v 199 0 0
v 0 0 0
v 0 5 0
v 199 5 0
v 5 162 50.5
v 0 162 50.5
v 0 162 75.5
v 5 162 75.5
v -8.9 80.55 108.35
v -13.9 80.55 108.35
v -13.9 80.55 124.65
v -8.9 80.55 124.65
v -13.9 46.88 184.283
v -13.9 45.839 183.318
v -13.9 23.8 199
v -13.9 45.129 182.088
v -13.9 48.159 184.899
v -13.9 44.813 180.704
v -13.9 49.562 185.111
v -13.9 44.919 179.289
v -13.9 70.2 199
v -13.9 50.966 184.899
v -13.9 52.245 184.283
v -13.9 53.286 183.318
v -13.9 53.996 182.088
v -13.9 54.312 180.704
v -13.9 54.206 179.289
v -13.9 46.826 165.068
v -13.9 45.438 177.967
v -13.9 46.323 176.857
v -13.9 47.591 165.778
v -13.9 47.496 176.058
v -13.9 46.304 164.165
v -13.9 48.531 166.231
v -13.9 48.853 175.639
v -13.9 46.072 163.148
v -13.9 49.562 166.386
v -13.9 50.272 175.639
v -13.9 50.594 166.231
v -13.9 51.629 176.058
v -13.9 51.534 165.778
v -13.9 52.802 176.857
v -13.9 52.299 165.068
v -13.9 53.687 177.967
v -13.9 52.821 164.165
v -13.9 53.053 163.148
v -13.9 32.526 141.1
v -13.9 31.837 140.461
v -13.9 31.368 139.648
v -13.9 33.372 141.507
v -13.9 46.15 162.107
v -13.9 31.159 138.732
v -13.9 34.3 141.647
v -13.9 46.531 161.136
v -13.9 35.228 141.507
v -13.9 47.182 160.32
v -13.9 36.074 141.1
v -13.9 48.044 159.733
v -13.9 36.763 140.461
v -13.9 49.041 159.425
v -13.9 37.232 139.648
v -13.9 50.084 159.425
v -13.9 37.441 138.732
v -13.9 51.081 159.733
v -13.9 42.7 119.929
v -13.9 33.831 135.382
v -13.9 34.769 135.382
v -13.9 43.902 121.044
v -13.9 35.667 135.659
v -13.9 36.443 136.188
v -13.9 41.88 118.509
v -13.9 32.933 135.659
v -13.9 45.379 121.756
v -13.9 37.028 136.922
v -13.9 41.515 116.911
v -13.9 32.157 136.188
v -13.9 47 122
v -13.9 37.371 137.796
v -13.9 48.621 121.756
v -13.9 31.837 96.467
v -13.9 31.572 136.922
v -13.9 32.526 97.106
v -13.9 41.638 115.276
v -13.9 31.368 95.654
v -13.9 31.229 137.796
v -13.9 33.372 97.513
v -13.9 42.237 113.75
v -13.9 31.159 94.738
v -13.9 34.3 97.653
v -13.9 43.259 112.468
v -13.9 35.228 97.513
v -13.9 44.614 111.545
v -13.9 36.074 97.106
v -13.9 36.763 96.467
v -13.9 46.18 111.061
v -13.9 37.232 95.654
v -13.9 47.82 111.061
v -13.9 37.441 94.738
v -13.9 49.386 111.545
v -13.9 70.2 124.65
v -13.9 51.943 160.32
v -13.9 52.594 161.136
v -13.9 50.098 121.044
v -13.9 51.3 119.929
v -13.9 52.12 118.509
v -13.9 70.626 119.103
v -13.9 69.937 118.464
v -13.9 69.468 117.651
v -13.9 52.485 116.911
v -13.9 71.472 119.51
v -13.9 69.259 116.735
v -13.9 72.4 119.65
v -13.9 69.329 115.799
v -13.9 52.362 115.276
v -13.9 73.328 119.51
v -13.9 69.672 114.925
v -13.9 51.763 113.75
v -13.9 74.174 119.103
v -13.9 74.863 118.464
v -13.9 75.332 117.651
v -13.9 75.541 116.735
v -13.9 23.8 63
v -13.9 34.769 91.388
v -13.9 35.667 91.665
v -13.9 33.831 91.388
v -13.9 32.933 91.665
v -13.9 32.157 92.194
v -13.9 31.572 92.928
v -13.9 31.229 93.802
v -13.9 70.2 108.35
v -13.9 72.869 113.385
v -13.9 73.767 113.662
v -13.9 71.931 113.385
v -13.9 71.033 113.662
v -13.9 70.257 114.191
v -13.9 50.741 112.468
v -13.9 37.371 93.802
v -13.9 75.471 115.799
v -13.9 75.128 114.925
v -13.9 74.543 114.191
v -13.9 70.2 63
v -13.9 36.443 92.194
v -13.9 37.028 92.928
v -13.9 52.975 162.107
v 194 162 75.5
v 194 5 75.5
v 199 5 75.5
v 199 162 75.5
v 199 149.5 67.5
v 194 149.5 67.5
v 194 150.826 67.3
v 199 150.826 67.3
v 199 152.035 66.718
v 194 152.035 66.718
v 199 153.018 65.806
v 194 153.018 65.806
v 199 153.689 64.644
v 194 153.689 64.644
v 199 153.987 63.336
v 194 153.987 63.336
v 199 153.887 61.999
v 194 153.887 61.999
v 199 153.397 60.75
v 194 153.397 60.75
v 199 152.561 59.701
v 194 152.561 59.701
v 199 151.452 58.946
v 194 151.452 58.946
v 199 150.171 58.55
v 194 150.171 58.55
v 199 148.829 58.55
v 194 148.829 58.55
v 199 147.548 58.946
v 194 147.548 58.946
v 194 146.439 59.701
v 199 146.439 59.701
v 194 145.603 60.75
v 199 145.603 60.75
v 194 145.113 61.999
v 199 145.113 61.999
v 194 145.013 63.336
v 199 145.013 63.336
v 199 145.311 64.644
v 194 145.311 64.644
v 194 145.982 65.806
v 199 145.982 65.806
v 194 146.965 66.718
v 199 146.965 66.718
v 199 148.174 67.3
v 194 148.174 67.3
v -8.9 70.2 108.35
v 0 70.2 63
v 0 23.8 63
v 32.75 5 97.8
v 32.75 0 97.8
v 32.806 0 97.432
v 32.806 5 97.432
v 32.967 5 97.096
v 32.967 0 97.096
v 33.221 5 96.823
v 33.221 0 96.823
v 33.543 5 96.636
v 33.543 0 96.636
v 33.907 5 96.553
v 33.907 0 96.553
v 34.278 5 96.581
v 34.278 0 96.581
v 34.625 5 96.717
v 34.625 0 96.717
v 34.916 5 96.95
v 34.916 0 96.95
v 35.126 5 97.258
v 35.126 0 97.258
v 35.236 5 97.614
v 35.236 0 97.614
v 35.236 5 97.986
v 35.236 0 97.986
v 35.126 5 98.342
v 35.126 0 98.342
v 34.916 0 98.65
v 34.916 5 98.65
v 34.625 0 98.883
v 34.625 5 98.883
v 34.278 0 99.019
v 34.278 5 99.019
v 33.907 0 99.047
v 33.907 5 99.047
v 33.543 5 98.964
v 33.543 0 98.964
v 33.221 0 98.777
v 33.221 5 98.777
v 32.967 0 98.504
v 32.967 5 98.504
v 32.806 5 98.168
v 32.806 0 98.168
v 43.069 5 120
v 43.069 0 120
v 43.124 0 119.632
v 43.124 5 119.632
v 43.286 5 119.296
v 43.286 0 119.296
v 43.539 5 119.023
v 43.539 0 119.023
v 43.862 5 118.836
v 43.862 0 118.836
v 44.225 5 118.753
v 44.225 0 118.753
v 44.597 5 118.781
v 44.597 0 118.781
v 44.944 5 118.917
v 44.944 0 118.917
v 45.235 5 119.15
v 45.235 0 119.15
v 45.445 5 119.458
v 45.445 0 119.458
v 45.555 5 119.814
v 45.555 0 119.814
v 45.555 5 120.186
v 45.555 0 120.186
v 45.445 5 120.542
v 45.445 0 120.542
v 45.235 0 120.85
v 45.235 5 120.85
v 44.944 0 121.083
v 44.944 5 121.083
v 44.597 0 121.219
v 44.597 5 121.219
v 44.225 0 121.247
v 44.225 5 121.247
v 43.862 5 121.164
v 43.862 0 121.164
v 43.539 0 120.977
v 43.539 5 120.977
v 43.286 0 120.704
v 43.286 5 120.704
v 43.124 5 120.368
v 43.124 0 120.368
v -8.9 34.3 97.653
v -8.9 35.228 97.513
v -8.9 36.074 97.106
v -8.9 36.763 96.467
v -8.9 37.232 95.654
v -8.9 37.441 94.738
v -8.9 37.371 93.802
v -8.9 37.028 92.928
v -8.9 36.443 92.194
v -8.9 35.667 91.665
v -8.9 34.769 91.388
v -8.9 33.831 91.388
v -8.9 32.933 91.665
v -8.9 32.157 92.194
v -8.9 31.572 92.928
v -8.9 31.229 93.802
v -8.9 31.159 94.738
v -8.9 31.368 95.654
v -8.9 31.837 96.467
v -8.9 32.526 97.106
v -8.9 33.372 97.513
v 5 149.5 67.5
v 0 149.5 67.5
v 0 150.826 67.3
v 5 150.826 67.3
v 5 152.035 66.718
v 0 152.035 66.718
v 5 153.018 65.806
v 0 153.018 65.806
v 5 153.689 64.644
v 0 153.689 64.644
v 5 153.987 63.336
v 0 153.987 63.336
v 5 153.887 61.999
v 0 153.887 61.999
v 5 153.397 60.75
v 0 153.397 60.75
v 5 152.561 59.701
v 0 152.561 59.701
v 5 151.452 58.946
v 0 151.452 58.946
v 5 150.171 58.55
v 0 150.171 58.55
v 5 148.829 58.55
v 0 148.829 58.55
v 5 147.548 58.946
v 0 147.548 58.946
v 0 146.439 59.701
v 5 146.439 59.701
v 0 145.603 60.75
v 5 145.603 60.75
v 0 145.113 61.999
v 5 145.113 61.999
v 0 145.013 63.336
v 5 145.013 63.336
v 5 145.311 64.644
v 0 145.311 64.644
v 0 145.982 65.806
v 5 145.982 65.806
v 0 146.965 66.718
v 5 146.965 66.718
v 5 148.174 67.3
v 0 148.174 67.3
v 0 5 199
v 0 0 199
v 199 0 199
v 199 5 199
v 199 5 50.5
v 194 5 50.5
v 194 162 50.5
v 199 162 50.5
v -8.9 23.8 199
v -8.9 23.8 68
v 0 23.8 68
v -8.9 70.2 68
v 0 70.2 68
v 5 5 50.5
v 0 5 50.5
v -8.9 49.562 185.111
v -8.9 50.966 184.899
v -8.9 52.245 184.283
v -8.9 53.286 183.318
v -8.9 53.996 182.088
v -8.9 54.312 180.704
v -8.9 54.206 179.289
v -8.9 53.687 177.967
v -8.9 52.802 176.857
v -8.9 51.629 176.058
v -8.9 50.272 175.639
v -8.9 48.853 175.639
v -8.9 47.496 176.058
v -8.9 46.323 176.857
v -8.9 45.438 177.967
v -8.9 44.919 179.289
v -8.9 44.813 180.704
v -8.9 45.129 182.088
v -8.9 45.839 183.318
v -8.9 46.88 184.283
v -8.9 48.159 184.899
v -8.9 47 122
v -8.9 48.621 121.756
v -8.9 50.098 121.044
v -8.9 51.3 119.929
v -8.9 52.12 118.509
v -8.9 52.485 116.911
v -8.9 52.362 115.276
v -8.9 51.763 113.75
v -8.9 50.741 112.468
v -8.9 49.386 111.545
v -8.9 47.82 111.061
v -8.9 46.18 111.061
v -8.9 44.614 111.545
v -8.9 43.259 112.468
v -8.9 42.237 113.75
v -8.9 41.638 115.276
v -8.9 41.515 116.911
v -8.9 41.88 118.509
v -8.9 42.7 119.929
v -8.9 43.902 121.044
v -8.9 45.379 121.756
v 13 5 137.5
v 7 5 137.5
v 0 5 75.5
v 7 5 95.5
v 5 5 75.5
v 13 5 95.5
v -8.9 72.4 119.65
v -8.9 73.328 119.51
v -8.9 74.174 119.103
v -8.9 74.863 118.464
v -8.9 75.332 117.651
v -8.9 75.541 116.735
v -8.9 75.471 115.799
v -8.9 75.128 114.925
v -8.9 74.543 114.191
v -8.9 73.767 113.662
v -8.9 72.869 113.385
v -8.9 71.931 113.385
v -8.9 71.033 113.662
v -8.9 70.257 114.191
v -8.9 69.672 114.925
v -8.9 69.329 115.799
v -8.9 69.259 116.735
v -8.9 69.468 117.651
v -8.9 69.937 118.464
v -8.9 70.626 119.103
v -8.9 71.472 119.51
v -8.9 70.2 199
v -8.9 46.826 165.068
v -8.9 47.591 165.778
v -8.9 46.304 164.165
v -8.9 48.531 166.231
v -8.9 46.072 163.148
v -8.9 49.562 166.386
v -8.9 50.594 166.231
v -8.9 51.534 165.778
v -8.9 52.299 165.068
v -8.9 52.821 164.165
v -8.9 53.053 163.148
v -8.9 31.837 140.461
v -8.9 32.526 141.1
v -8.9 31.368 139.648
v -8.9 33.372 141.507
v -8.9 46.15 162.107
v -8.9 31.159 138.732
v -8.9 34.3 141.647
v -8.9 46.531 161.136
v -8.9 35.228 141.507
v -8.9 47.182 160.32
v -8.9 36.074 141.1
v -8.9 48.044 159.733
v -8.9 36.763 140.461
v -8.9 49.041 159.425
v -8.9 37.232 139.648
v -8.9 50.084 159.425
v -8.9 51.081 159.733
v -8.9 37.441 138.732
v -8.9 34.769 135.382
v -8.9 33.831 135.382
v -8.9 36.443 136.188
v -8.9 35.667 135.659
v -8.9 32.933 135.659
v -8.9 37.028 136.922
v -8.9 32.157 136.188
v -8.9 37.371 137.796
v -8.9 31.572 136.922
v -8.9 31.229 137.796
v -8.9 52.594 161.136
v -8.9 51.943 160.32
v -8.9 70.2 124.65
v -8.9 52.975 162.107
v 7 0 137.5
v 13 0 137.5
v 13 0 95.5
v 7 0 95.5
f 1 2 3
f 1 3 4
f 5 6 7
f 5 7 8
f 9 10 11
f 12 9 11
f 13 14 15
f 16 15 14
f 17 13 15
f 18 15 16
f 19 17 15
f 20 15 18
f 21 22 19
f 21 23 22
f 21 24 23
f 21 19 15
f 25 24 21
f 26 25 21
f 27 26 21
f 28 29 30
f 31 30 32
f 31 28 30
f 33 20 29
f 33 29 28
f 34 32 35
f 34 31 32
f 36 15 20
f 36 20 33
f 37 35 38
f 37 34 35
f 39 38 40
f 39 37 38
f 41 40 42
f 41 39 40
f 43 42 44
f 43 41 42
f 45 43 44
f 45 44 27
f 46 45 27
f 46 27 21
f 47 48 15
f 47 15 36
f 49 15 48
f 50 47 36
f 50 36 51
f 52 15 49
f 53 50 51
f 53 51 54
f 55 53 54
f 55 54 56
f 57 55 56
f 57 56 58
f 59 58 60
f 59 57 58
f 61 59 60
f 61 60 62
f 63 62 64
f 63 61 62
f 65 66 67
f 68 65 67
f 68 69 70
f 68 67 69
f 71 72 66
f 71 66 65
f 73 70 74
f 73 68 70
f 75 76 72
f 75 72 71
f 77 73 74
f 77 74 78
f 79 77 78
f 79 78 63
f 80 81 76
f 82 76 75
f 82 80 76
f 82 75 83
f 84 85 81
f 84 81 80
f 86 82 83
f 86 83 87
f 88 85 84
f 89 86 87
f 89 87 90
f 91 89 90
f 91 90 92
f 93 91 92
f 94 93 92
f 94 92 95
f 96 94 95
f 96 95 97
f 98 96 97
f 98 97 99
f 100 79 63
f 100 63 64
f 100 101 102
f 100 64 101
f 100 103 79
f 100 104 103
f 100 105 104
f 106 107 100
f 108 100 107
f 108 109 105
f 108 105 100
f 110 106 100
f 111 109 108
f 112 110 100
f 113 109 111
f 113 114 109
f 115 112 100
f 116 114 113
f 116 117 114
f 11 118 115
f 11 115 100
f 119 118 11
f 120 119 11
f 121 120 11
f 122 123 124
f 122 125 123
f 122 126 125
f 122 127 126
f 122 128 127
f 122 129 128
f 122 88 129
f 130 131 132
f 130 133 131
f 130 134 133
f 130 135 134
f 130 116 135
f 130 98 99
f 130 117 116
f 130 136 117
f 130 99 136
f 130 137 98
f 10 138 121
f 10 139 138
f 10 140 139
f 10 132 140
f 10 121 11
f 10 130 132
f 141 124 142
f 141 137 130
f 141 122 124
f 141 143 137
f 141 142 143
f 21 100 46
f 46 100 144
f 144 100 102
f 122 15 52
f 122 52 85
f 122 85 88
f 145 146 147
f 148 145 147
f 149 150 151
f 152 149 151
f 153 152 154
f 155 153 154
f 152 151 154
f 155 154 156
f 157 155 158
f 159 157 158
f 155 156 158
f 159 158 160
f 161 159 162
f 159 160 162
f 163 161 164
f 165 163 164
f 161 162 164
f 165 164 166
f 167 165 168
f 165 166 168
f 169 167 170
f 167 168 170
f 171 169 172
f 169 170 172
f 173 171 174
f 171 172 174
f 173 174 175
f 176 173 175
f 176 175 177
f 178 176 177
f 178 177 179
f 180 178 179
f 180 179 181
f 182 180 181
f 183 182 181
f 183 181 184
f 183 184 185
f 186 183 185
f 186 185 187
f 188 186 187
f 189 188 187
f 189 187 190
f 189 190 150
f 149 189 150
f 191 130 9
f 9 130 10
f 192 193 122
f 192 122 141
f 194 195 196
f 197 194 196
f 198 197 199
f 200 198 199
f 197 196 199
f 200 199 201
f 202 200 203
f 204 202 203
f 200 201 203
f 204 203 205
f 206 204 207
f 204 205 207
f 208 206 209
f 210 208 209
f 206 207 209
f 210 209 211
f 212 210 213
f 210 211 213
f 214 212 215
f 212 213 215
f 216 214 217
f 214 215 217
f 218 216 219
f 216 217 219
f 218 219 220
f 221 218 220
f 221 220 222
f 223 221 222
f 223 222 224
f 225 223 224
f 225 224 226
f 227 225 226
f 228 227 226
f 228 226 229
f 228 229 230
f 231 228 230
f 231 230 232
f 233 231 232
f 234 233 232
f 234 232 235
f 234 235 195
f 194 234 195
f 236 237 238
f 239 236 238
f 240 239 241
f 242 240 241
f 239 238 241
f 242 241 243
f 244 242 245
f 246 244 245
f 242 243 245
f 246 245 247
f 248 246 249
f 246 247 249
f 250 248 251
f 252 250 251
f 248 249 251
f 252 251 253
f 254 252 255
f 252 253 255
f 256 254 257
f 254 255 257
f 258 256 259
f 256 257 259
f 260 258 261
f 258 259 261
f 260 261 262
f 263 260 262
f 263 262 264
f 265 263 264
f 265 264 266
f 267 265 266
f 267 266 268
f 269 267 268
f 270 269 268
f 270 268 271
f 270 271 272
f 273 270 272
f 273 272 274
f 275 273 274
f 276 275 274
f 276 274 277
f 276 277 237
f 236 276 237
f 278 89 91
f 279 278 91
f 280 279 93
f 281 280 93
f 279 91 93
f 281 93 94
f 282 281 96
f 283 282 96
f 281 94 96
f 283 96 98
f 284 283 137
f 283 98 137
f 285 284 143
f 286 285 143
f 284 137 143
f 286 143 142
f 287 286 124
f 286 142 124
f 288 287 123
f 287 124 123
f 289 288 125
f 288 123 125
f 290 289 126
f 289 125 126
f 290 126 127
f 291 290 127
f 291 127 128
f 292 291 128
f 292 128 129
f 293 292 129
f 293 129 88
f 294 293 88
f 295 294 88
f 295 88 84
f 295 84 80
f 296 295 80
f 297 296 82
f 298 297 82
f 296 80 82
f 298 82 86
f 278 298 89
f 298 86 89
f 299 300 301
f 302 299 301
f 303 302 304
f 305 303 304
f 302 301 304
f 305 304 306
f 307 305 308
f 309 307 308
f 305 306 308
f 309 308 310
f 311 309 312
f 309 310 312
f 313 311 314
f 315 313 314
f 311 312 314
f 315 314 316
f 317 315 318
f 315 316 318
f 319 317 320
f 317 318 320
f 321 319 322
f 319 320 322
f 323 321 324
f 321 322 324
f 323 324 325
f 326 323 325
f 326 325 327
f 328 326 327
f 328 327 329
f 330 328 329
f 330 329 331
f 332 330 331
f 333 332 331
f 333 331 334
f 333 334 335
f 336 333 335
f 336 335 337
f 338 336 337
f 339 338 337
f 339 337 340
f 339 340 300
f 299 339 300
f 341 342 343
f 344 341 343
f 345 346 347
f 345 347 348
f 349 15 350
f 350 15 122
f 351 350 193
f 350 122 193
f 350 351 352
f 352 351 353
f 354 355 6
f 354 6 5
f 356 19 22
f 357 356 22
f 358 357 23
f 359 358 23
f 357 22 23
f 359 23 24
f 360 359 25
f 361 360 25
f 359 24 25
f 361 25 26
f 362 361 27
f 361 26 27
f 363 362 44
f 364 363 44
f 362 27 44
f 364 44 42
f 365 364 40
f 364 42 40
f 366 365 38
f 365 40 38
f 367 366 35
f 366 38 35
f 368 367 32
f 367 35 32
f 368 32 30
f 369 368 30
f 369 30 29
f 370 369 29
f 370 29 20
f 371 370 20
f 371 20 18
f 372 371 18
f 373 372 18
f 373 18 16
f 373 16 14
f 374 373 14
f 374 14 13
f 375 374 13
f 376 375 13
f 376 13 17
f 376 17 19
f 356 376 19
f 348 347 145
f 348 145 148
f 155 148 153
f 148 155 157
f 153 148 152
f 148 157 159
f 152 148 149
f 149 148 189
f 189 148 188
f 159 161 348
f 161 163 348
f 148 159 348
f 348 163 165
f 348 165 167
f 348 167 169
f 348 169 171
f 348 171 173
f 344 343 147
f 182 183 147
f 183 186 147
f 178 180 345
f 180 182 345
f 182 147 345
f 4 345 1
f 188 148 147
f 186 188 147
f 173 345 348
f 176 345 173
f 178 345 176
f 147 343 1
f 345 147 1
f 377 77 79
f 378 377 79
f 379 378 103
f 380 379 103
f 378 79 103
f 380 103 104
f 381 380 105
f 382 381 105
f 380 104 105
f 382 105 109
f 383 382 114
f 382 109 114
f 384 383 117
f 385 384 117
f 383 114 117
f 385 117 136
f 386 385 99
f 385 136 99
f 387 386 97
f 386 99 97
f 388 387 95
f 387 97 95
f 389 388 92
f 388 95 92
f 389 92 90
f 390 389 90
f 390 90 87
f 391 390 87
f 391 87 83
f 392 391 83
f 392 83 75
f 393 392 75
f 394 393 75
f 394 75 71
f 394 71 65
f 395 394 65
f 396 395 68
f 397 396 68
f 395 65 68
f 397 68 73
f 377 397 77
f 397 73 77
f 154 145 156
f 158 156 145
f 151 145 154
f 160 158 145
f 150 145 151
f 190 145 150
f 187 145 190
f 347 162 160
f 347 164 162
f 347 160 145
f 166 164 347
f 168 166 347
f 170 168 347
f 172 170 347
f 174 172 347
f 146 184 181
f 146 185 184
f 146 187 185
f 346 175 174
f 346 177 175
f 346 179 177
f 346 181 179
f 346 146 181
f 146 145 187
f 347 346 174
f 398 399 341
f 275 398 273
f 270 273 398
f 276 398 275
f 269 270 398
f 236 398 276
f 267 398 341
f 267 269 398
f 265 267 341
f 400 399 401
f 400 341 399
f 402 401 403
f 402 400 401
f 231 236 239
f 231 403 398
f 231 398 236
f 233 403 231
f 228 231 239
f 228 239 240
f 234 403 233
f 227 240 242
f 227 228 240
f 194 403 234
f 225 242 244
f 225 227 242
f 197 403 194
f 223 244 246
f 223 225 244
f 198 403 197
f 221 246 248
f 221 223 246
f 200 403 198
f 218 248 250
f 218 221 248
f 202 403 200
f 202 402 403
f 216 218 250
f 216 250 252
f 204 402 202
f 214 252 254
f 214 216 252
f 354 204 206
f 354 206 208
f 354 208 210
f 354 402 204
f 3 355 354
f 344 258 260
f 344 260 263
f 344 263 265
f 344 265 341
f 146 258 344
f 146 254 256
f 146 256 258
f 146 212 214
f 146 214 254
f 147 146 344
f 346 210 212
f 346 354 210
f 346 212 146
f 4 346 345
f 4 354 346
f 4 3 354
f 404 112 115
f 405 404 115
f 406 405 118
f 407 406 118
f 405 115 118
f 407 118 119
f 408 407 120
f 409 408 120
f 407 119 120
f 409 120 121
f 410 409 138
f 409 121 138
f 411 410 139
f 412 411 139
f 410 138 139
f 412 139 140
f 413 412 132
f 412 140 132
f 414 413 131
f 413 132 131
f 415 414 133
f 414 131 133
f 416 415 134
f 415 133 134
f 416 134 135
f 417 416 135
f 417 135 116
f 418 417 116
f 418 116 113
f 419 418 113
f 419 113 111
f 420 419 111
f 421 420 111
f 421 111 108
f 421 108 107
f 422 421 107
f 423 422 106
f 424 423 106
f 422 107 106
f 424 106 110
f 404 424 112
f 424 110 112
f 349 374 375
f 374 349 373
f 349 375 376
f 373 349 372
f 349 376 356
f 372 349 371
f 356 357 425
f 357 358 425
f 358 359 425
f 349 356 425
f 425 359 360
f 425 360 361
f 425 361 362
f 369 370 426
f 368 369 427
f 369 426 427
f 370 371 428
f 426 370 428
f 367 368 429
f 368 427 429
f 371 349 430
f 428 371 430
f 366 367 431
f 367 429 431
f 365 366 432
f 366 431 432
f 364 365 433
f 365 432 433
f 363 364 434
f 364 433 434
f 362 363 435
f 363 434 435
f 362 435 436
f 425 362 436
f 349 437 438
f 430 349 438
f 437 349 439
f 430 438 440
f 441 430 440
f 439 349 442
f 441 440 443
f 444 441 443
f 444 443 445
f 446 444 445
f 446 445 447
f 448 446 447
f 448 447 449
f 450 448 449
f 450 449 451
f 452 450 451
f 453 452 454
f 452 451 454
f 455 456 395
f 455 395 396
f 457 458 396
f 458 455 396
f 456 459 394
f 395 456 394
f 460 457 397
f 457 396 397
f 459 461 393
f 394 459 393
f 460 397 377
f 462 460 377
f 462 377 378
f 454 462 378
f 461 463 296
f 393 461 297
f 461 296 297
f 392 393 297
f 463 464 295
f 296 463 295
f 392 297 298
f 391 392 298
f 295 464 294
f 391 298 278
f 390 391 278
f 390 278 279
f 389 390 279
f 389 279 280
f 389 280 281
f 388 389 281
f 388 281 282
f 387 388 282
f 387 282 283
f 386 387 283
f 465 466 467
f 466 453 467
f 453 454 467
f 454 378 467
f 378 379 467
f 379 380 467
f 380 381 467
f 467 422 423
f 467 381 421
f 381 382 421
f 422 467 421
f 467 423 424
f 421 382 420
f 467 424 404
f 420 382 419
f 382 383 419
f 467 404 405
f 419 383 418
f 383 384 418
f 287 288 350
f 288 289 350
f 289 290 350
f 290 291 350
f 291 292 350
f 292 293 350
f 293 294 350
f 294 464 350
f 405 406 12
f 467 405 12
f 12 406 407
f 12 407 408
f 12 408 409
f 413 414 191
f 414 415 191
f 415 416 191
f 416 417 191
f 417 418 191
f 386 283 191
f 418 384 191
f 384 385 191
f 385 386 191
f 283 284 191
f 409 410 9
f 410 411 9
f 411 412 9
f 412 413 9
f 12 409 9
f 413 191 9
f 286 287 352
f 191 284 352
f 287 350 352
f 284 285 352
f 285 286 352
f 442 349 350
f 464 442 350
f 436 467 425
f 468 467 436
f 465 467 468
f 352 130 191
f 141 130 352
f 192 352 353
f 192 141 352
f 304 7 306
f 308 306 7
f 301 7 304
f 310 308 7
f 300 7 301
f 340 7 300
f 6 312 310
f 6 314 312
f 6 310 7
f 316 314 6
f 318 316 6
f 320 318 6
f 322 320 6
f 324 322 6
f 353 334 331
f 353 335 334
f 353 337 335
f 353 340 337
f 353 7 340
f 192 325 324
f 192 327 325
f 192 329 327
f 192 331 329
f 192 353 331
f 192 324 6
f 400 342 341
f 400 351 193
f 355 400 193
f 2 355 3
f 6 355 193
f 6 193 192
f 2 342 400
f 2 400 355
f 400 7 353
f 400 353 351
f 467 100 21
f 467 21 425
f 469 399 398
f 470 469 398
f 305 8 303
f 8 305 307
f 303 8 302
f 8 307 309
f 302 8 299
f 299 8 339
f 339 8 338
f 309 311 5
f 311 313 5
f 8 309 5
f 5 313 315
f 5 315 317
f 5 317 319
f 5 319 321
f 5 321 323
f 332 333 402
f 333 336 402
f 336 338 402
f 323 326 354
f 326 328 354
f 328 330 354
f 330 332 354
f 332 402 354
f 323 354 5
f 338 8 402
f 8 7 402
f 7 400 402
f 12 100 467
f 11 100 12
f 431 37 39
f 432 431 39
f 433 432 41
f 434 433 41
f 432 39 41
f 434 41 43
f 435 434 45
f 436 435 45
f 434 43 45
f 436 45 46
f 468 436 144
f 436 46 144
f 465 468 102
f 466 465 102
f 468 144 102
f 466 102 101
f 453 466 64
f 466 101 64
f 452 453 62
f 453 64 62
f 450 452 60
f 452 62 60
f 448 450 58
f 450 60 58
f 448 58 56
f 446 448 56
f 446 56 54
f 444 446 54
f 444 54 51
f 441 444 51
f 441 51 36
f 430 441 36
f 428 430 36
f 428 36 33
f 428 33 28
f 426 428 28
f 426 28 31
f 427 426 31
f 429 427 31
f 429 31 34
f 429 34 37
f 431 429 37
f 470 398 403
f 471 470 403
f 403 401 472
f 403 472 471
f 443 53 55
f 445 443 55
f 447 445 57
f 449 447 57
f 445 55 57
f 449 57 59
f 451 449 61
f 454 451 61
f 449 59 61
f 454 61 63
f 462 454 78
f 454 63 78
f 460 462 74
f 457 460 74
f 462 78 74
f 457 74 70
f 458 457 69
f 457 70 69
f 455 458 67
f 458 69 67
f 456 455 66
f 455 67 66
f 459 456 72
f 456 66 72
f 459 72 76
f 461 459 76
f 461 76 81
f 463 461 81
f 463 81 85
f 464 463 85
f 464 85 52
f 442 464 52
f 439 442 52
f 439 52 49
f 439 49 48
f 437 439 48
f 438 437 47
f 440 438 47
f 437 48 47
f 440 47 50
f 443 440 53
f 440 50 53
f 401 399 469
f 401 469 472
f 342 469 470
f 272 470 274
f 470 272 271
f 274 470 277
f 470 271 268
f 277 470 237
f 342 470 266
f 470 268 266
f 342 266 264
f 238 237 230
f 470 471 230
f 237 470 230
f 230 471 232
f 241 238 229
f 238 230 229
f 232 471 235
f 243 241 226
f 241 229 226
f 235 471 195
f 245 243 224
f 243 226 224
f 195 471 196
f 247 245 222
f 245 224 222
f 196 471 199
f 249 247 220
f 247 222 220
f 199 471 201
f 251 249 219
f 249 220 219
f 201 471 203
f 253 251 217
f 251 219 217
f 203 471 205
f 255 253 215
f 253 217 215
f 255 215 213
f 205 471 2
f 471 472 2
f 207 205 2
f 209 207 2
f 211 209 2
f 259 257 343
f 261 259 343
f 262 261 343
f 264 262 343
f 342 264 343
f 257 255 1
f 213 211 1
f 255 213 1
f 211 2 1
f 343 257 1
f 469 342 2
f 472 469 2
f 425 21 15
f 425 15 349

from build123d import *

# Parameters (mm, degrees)
SKETCH1_W                 = 199
SKETCH1_H                 = 199
BOSS_EXTRUDE1_DEPTH       = 5
SKETCH2_W                 = 5
SKETCH2_H                 = 25
BOSS_EXTRUDE2_DEPTH       = 18.8
SKETCH3_W                 = 5
SKETCH3_H                 = 25
BOSS_EXTRUDE3_DEPTH       = 46.4
SKETCH4_W                 = 5
SKETCH4_H                 = 25
BOSS_EXTRUDE4_DEPTH       = 91.8
SKETCH5_W                 = 5
SKETCH5_H                 = 25
BOSS_EXTRUDE5_DEPTH       = 157
SKETCH6_R                 = 4.5
CUT_EXTRUDE1_DEPTH        = 325.724498614
SKETCH8_W                 = 5
SKETCH8_H                 = 46.4
BOSS_EXTRUDE6_DEPTH       = 13.9
SKETCH9_W                 = 5
SKETCH9_H                 = 46.4
BOSS_EXTRUDE7_DEPTH       = 131
SKETCH11_W                = 16.3
SKETCH11_H                = 10.35
BOSS_EXTRUDE8_DEPTH       = 5
SKETCH10_R                = 5.5
SKETCH10_R_2              = 3.15
CUT_EXTRUDE2_DEPTH        = 5
SKETCH12_W                = 6
SKETCH12_H                = 42
CUT_EXTRUDE3_DEPTH        = 5
SKETCH17_R                = 3.5
CUT_EXTRUDE7_DEPTH        = 9
M3X0_5_TAPPED_HOLE1_D     = 2.5
M3X0_5_TAPPED_HOLE1_DEPTH = 7.5
M3X0_5_TAPPED_HOLE1_TIP   = 0.751075774
SKETCH20_R                = 4.7625
CUT_EXTRUDE8_DEPTH        = 10


with BuildPart() as part:
    # Sketch1 → Boss-Extrude1 (new body)
    with BuildSketch(Plane(origin=(0, 0, 0), x_dir=(1, 0, 0), z_dir=(0, 1, 0))):
        with Locations((99.5, -99.5)):
            Rectangle(SKETCH1_W, SKETCH1_H)
    extrude(amount=BOSS_EXTRUDE1_DEPTH)

    # Sketch2 → Boss-Extrude2 (add)
    with BuildSketch(Plane(origin=(0, 5, 0), x_dir=(1, 0, 0), z_dir=(0, 1, 0))):
        with Locations((2.5, -63)):
            Rectangle(SKETCH2_W, SKETCH2_H)
    extrude(amount=BOSS_EXTRUDE2_DEPTH)

    # Sketch3 → Boss-Extrude3 (add)
    with BuildSketch(Plane(origin=(0, 23.8, 0), x_dir=(1, 0, 0), z_dir=(0, 1, 0))):
        with Locations((2.5, -63)):
            Rectangle(SKETCH3_W, SKETCH3_H)
    extrude(amount=BOSS_EXTRUDE3_DEPTH)

    # Sketch4 → Boss-Extrude4 (add)
    with BuildSketch(Plane(origin=(0, 70.2, 0), x_dir=(1, 0, 0), z_dir=(0, 1, 0))):
        with Locations((2.5, -63)):
            Rectangle(SKETCH4_W, SKETCH4_H)
    extrude(amount=BOSS_EXTRUDE4_DEPTH)

    # Sketch5 → Boss-Extrude5 (add)
    with BuildSketch(Plane(origin=(0, 5, 0), x_dir=(1, 0, 0), z_dir=(0, 1, 0))):
        with Locations((196.5, -63)):
            Rectangle(SKETCH5_W, SKETCH5_H)
    extrude(amount=BOSS_EXTRUDE5_DEPTH)

    # Sketch6 → Cut-Extrude1 (cut, through all)
    with BuildSketch(Plane.ZY):
        with Locations((63, 149.5)):
            Circle(SKETCH6_R)
    extrude(amount=-CUT_EXTRUDE1_DEPTH, mode=Mode.SUBTRACT)

    # Sketch8 → Boss-Extrude6 (add)
    with BuildSketch(Plane.ZY):
        with Locations((65.5, 47)):
            Rectangle(SKETCH8_W, SKETCH8_H)
    extrude(amount=BOSS_EXTRUDE6_DEPTH)

    # Sketch9 → Boss-Extrude7 (add)
    with BuildSketch(Plane.XY.offset(68)):
        with Locations((-11.4, 47)):
            Rectangle(SKETCH9_W, SKETCH9_H)
    extrude(amount=BOSS_EXTRUDE7_DEPTH)

    # Sketch11 → Boss-Extrude8 (add)
    with BuildSketch(Plane.ZY.offset(13.9)):
        with Locations((116.5, 75.375)):
            Rectangle(SKETCH11_W, SKETCH11_H)
    extrude(amount=-BOSS_EXTRUDE8_DEPTH)

    # Sketch10 → Cut-Extrude2 (cut)
    with BuildSketch(Plane.ZY.offset(13.9)):
        with Locations((116.5, 47)):
            Circle(SKETCH10_R)
        with Locations((116.5, 72.4)):
            Circle(SKETCH10_R_2)
        with Locations((138.497045256, 34.3)):
            Circle(SKETCH10_R_2)
        with Locations((94.502954744, 34.3)):
            Circle(SKETCH10_R_2)
    extrude(amount=-CUT_EXTRUDE2_DEPTH, mode=Mode.SUBTRACT)

    # Sketch12 → Cut-Extrude3 (cut)
    with BuildSketch(Plane(origin=(0, 5, 0), x_dir=(1, 0, 0), z_dir=(0, 1, 0))):
        with Locations((10, -116.5)):
            Rectangle(SKETCH12_W, SKETCH12_H)
    extrude(amount=-CUT_EXTRUDE3_DEPTH, mode=Mode.SUBTRACT)

    # Sketch17 → Cut-Extrude7 (cut)
    with BuildSketch(Plane.ZY.offset(13.9)):
        with Locations((162.886026442, 49.5625)):
            Circle(SKETCH17_R)
    extrude(amount=-CUT_EXTRUDE7_DEPTH, mode=Mode.SUBTRACT)

    # M3x0.5 Tapped Hole1
    with Locations(Plane(origin=(0, 5, 0), x_dir=(1, 0, 0), z_dir=(0, 1, 0))):
        with Locations((34, -97.8), (44.31875, -120)):
            Hole(M3X0_5_TAPPED_HOLE1_D / 2, depth=M3X0_5_TAPPED_HOLE1_DEPTH)
            with Locations((0, 0, -(M3X0_5_TAPPED_HOLE1_DEPTH + M3X0_5_TAPPED_HOLE1_TIP / 2))):  # 118° drill point
                Cone(0, M3X0_5_TAPPED_HOLE1_D / 2, M3X0_5_TAPPED_HOLE1_TIP, mode=Mode.SUBTRACT)

    # Sketch20 → Cut-Extrude8 (cut)
    with BuildSketch(Plane.ZY.offset(13.9)):
        with Locations((180.348526442, 49.5625)):
            Circle(SKETCH20_R)
    extrude(amount=-CUT_EXTRUDE8_DEPTH, mode=Mode.SUBTRACT)


solid = part.part
